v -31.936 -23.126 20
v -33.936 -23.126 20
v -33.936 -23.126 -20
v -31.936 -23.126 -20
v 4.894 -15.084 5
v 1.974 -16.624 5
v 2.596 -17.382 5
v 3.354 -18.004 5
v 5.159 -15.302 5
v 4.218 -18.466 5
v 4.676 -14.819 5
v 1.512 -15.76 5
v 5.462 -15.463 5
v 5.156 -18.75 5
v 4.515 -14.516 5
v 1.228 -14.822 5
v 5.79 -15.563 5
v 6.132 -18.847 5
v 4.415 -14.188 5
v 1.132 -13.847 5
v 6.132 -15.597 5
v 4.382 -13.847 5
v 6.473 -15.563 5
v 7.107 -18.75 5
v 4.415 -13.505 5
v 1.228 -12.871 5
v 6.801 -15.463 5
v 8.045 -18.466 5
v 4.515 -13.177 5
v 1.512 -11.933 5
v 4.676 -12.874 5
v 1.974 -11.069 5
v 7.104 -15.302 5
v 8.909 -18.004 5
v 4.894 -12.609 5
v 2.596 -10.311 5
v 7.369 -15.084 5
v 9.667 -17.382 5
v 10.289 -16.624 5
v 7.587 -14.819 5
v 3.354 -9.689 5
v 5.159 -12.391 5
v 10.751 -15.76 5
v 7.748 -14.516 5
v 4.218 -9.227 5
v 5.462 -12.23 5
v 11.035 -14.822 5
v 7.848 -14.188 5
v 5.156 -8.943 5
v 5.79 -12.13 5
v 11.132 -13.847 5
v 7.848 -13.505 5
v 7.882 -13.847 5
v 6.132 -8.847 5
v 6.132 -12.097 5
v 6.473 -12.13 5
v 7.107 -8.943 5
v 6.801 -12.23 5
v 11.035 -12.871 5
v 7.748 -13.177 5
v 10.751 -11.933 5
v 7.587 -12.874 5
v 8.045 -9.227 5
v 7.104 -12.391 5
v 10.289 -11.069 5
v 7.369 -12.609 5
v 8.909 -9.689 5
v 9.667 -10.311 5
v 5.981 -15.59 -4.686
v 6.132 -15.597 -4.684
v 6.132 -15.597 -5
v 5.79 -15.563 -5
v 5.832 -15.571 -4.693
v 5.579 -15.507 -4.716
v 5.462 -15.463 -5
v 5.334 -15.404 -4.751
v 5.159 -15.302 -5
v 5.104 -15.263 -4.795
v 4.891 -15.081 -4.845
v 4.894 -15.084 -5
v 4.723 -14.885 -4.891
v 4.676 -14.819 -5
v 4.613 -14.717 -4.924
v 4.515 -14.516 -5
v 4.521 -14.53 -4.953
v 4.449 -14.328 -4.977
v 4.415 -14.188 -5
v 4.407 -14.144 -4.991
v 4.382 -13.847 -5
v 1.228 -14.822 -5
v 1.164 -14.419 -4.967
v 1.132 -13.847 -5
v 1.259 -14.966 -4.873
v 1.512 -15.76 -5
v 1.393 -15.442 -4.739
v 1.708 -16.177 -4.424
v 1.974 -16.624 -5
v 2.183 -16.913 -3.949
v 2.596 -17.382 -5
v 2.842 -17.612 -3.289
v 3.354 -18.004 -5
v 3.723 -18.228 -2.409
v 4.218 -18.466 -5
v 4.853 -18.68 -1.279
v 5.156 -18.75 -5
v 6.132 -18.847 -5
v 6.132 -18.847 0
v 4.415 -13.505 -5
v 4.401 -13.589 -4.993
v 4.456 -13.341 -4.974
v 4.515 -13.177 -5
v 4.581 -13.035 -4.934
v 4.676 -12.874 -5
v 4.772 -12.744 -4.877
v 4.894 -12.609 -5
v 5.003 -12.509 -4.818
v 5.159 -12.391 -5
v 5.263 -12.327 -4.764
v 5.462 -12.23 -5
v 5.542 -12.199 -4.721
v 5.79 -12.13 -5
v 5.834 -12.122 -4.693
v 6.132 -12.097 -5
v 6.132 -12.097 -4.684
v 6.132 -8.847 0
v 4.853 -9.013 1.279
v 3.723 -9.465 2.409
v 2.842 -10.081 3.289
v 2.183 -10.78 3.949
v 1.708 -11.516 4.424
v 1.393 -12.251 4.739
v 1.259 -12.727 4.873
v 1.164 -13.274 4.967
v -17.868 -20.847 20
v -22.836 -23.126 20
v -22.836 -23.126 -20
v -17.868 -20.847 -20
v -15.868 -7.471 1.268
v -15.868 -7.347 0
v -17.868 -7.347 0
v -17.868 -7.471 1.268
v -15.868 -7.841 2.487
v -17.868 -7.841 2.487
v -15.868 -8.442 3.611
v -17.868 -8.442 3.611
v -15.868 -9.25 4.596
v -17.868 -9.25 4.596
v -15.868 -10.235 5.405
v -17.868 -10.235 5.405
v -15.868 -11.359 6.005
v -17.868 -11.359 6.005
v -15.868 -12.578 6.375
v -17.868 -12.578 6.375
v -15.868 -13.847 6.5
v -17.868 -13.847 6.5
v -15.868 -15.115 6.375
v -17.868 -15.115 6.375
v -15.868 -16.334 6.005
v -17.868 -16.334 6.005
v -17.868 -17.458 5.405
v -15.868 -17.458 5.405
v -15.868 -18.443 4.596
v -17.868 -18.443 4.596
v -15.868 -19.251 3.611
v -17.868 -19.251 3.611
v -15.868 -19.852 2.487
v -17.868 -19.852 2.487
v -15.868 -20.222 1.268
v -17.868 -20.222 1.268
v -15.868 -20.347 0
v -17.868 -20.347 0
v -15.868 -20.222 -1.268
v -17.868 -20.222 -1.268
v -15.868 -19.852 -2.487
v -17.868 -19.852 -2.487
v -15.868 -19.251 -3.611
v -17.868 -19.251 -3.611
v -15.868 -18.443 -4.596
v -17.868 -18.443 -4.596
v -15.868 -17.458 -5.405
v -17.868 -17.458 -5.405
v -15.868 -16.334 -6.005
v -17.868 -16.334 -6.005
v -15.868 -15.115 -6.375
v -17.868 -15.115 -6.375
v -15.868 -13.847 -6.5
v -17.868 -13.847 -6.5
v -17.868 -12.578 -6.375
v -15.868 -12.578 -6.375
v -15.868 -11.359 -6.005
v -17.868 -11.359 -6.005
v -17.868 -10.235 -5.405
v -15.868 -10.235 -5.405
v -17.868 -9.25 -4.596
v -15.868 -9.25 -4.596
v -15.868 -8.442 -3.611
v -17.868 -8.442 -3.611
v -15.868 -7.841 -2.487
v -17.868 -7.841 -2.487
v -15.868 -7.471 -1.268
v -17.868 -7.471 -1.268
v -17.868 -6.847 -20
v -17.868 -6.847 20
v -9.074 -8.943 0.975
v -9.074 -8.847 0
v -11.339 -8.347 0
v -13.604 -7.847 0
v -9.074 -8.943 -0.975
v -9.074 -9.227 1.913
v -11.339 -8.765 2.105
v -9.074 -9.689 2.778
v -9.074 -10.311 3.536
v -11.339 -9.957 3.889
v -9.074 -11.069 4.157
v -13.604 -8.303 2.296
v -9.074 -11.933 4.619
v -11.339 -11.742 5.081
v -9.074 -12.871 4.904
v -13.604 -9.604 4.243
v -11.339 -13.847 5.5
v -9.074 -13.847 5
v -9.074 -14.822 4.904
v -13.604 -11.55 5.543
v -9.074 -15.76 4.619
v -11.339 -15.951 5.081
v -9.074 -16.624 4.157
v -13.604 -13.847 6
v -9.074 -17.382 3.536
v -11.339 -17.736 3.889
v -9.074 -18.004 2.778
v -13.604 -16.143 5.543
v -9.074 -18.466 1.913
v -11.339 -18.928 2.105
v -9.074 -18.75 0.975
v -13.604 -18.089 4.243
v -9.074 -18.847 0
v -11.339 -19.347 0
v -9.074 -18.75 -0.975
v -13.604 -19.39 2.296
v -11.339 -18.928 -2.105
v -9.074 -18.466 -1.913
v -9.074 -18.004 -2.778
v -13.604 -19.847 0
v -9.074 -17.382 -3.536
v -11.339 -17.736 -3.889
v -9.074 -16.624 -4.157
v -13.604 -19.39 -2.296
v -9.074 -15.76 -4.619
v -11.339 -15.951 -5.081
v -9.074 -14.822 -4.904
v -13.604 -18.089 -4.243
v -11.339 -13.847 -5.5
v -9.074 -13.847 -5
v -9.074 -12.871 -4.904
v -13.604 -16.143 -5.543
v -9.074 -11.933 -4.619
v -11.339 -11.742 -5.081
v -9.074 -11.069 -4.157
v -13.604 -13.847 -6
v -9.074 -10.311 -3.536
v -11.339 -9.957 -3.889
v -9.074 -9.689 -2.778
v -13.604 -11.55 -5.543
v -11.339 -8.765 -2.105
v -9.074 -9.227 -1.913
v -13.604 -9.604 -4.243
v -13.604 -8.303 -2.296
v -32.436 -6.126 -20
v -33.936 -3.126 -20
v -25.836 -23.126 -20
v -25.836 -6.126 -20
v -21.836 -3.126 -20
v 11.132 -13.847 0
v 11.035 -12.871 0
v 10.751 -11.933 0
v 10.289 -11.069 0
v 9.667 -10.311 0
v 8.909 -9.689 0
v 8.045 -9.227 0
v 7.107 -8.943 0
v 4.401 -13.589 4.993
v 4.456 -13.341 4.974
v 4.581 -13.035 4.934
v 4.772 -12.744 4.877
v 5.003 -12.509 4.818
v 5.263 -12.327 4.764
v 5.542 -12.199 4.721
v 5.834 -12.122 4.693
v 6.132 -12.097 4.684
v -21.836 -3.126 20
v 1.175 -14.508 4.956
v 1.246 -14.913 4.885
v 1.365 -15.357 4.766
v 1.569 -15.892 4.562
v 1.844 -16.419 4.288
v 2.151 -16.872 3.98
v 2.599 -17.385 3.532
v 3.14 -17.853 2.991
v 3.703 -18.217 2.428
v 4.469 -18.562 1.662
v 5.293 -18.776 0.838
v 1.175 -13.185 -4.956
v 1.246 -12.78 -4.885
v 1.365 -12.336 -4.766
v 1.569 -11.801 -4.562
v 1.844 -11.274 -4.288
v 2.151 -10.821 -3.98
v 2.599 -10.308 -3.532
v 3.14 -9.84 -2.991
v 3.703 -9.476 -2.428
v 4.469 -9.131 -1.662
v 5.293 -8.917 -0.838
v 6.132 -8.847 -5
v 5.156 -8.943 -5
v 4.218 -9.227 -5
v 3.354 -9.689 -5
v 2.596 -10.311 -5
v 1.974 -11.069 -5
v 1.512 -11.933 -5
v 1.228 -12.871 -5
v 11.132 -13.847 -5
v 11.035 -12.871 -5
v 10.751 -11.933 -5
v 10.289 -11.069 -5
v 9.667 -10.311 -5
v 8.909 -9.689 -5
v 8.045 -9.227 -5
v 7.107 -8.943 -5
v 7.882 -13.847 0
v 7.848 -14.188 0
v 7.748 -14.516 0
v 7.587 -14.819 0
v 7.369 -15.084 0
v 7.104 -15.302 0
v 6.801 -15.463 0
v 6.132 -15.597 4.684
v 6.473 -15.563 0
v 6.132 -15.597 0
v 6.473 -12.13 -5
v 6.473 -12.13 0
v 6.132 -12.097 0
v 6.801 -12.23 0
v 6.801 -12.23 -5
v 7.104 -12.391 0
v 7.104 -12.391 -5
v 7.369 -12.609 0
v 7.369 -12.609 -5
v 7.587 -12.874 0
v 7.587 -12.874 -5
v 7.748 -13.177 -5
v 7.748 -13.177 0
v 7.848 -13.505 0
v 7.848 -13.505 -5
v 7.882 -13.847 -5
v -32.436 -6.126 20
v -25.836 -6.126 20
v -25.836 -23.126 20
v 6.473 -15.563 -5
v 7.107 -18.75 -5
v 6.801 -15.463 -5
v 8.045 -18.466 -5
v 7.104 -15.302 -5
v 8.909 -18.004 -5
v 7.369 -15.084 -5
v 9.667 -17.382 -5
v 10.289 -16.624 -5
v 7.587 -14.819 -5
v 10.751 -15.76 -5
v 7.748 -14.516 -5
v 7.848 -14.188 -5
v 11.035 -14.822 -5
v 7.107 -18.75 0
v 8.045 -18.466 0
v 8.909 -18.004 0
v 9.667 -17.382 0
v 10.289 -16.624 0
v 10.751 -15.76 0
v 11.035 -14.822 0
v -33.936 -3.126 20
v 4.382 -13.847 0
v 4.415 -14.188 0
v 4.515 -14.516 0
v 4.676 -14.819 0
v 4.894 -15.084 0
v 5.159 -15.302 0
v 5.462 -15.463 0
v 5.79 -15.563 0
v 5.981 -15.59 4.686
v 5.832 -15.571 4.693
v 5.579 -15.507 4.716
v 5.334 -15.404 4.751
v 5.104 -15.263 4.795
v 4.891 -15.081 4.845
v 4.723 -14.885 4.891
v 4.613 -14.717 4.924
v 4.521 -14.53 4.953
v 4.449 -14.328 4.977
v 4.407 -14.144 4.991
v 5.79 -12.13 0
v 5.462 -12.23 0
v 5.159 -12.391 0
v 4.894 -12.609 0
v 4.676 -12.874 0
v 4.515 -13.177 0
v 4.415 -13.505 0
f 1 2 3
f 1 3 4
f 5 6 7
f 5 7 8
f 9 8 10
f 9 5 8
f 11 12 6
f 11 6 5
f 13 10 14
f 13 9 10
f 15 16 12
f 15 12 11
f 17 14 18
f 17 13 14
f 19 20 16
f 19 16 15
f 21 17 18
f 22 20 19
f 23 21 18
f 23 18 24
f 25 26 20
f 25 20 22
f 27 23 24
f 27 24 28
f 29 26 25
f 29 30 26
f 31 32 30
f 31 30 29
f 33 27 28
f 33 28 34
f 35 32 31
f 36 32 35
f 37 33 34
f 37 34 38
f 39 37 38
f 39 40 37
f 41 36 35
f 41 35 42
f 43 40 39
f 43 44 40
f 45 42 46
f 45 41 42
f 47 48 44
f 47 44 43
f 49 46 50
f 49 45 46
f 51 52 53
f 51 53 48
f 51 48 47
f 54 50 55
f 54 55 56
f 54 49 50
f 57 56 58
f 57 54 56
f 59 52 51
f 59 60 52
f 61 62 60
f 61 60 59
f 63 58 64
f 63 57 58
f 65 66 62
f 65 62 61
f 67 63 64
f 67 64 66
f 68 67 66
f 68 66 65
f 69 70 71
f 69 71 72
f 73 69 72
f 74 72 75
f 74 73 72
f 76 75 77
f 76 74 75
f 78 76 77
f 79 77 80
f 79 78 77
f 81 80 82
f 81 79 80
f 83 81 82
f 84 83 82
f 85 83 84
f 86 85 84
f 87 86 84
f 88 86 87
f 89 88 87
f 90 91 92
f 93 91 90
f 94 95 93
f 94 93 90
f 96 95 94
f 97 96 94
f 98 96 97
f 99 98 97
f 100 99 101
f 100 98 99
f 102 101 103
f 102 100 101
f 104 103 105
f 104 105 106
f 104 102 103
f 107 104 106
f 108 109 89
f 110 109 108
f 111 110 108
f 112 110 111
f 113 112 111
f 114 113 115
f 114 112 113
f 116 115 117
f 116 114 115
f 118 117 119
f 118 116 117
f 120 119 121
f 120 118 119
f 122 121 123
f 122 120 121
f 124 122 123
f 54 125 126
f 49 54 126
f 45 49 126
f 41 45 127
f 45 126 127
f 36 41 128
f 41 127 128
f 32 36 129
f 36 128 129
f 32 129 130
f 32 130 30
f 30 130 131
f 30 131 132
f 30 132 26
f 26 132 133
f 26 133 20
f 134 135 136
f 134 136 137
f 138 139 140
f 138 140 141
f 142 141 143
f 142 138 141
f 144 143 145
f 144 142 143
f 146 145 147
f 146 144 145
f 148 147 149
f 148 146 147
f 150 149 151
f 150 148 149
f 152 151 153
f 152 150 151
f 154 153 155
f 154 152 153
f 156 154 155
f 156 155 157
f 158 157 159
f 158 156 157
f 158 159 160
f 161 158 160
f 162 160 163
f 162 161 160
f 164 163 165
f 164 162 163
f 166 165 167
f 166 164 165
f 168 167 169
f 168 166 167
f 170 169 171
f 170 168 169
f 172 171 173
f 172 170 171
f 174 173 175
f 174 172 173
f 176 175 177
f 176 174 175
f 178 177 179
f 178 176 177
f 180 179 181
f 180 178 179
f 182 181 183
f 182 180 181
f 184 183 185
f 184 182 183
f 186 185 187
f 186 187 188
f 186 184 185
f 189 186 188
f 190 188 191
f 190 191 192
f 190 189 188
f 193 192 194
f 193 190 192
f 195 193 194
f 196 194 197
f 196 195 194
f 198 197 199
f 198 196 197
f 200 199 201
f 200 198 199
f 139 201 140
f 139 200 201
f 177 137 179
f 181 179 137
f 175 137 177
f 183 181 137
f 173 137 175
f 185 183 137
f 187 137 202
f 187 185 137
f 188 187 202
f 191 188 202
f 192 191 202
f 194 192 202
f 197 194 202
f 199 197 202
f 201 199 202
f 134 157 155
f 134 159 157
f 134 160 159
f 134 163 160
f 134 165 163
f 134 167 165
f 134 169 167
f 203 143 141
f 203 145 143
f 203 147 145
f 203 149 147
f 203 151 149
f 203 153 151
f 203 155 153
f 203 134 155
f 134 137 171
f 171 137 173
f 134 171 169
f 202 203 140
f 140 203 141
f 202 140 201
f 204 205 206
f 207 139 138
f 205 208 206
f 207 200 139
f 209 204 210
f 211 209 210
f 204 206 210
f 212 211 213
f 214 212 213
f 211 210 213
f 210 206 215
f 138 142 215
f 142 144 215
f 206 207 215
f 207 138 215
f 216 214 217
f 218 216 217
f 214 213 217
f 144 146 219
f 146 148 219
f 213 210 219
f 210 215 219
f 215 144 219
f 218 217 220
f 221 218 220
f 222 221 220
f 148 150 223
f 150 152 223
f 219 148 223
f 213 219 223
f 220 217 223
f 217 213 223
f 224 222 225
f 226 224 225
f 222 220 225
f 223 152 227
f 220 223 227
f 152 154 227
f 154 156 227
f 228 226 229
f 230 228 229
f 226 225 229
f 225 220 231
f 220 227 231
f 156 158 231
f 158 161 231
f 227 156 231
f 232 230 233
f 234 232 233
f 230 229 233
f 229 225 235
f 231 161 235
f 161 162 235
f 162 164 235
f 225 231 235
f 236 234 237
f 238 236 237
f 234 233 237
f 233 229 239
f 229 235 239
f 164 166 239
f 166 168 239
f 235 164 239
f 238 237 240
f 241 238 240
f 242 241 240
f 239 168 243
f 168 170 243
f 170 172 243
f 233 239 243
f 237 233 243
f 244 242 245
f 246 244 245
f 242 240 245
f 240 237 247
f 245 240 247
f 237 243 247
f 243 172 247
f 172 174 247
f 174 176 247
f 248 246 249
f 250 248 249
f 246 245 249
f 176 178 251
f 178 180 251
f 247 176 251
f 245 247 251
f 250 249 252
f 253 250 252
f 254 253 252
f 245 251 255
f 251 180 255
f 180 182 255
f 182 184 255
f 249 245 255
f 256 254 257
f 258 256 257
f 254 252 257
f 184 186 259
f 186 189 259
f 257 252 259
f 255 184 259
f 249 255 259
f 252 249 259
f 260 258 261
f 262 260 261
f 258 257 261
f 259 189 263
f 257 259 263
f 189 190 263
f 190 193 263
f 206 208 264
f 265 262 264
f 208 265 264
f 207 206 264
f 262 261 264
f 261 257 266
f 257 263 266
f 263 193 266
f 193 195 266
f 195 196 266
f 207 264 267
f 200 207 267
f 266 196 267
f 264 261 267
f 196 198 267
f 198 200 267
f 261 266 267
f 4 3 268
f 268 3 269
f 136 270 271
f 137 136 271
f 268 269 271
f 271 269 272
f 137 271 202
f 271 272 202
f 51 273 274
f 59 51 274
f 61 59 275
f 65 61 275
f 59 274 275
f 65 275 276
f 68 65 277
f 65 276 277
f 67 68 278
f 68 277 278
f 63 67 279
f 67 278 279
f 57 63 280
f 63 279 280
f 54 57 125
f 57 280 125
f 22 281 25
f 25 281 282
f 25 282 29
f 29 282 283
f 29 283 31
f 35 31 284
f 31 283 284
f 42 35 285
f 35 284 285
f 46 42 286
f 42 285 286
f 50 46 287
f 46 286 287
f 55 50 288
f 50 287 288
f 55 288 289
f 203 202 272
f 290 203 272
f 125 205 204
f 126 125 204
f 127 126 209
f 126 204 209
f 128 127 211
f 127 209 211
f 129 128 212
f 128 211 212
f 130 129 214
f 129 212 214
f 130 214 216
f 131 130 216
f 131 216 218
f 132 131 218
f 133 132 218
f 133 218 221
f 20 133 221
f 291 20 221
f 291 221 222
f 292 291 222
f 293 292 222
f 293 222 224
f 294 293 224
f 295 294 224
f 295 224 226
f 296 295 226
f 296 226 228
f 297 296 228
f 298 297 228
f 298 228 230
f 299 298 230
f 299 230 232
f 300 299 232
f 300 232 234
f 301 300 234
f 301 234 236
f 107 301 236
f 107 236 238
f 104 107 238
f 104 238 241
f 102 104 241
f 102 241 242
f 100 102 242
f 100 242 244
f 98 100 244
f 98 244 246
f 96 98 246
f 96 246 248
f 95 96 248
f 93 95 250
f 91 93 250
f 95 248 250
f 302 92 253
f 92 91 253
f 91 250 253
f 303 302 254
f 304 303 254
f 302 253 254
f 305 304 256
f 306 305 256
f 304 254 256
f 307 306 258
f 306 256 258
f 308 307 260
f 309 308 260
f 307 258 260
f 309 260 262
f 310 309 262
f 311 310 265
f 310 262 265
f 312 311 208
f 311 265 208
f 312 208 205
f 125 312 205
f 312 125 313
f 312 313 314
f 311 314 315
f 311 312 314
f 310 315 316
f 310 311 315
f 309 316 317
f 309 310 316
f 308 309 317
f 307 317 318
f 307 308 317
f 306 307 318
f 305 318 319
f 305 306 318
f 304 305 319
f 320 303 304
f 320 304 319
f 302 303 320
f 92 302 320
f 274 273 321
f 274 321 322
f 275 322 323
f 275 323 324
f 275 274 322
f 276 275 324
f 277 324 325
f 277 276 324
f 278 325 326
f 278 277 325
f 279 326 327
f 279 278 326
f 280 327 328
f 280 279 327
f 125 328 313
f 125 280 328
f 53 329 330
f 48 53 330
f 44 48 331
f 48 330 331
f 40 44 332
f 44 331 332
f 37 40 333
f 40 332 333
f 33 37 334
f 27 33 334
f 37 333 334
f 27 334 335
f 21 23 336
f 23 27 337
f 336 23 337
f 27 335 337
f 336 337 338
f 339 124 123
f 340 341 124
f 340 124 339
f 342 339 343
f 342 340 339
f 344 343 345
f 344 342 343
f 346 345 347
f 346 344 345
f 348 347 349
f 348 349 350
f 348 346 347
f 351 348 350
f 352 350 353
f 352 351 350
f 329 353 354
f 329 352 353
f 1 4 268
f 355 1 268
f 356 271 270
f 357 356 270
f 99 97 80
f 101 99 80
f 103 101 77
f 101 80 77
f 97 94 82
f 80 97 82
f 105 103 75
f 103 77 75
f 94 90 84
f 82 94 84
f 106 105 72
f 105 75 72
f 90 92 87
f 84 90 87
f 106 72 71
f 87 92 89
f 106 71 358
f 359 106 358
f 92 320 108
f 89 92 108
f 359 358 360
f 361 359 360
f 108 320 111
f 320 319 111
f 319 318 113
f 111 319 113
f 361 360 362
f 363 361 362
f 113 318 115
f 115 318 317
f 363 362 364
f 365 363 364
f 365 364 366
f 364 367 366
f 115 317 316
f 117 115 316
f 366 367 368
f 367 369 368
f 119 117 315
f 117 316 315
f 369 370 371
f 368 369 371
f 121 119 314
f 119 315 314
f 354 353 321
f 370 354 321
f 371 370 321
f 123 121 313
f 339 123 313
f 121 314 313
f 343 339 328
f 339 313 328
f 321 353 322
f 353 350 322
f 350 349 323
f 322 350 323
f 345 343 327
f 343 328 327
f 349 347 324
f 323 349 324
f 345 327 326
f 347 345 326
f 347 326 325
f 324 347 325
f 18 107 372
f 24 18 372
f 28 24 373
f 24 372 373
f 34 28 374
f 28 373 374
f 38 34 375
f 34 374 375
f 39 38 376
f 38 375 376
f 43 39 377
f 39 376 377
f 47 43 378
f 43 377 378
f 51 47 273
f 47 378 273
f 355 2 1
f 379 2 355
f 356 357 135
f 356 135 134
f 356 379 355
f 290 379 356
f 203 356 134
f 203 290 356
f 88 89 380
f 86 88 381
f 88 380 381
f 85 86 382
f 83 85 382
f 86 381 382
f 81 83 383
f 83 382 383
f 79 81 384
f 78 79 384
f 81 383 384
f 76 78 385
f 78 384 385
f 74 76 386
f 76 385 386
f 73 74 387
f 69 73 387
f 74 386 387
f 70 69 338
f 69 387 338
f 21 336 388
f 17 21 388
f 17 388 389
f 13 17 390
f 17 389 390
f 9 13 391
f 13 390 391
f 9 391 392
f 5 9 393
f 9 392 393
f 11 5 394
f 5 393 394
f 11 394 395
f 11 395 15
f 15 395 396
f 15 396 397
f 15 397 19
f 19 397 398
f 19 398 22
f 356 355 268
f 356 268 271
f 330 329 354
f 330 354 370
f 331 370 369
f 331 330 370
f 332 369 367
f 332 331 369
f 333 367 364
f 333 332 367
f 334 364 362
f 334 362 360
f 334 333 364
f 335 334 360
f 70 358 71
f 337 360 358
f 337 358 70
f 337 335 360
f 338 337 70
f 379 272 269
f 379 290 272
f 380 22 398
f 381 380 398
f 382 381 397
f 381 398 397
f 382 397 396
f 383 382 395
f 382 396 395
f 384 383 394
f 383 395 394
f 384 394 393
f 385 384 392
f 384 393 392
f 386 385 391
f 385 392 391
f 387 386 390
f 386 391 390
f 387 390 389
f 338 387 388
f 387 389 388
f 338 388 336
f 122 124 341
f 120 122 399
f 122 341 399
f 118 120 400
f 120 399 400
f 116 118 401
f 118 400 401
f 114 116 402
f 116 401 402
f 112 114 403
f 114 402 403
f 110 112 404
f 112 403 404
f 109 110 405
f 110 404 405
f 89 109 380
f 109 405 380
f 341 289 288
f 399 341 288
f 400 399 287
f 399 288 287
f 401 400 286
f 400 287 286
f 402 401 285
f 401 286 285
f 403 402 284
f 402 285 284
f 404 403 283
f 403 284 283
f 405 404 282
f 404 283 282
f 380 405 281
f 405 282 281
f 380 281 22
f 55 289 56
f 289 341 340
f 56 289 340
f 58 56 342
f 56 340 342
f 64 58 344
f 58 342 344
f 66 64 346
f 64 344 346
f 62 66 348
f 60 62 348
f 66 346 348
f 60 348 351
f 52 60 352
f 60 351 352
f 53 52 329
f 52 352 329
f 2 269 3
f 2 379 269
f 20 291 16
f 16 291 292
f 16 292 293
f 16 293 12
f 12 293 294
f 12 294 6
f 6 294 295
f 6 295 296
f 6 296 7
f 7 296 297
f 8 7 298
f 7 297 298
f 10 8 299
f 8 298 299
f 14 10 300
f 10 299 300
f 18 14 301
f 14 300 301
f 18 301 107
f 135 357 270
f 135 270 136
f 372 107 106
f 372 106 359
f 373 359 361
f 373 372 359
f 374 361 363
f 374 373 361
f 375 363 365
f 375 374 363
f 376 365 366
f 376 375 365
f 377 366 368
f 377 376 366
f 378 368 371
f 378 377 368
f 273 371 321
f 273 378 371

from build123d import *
from build123d import SkipClean  # not in build123d's __all__

# Parameters (mm, degrees)
F1_DEPTH = 20
F0_W     = 2
F0_H     = 6.5
F5_DEPTH = 5
F6_DEPTH = 5


with BuildPart() as f1:
    # F0 (on Top) → F1 (new body, symmetric)
    with BuildSketch(Plane.XY):
        Polygon((-33.9359952807, -3.1263027601), (-33.9359952807, -23.1263027601), (-31.9359952807, -23.1263027601), (-32.4359952807, -6.1263027601), (-25.8359952807, -6.1263027601), (-25.8359952807, -23.1263027601), (-22.8359952807, -23.1263027601), (-17.8684814229, -20.8465269788), (-17.8684814229, -20.3465269788), (-17.8684814229, -13.8465269788), (-17.8684814229, -7.3465269788), (-17.8684814229, -6.8465269788), (-21.8359952807, -3.1263027601), align=None)
    extrude(amount=F1_DEPTH, both=True)

    # F0 (on Top) → F2 (revolve)
    with BuildSketch(Plane.XY):
        with Locations((-16.8684814229, -10.5965269788)):
            Rectangle(F0_W, F0_H)
    revolve(axis=Axis((-16.8684814229, -13.8465269788, 0), (1, 0, 0)))

    # F0 (on Top) → F3 (revolve)
    with BuildSketch(Plane.XY):
        Polygon((-9.0739962115, -8.8465269788), (-15.8684814229, -7.3465269788), (-15.8684814229, -13.8465269788), (-9.0739962115, -13.8465269788), align=None)
    revolve(axis=Axis((-4.8684814229, -13.8465269788, 0), (1, 0, 0)))

    # F0 (on Top) → F4 (revolve)
    with BuildSketch(Plane.XY):
        with BuildLine():
            Line((6.1315185771, -8.8465269788), (-9.0739962115, -8.8465269788))
            Line((-9.0739962115, -8.8465269788), (-9.0739962115, -13.8465269788))
            Line((-9.0739962115, -13.8465269788), (1.1315185771, -13.8465269788))
            ThreePointArc((1.1315185771, -13.8465269788), (2.5959846712, -10.3109930728), (6.1315185771, -8.8465269788))
        make_face()
        with BuildLine():
            Line((6.1315185771, -12.0965269788), (6.1315185771, -8.8465269788))
            ThreePointArc((6.1315185771, -8.8465269788), (2.5959846712, -10.3109930728), (1.1315185771, -13.8465269788))
            Line((1.1315185771, -13.8465269788), (4.3815185771, -13.8465269788))
            ThreePointArc((4.3815185771, -13.8465269788), (4.89408171, -12.6090901117), (6.1315185771, -12.0965269788))
        make_face()
        with BuildLine():
            Line((6.1315185771, -13.8465269788), (6.1315185771, -12.0965269788))
            ThreePointArc((6.1315185771, -12.0965269788), (4.89408171, -12.6090901117), (4.3815185771, -13.8465269788))
            Line((4.3815185771, -13.8465269788), (6.1315185771, -13.8465269788))
        make_face()
    revolve(axis=Axis((-4.8684814229, -13.8465269788, 0), (1, 0, 0)))

    # F0 (on Top) → F5 (cut, symmetric)
    with BuildSketch(Plane.XY):
        with BuildLine():
            Line((6.1315185771, -13.8465269788), (4.3815185771, -13.8465269788))
            ThreePointArc((4.3815185771, -13.8465269788), (4.89408171, -15.0839638459), (6.1315185771, -15.5965269788))
            Line((6.1315185771, -15.5965269788), (6.1315185771, -13.8465269788))
        make_face()
        with BuildLine():
            ThreePointArc((7.8815185771, -13.8465269788), (7.3689554442, -12.6090901117), (6.1315185771, -12.0965269788))
            Line((6.1315185771, -12.0965269788), (6.1315185771, -13.8465269788))
            Line((6.1315185771, -13.8465269788), (6.1315185771, -15.5965269788))
            ThreePointArc((6.1315185771, -15.5965269788), (7.3689554442, -15.0839638459), (7.8815185771, -13.8465269788))
        make_face()
        with BuildLine():
            Line((6.1315185771, -13.8465269788), (6.1315185771, -12.0965269788))
            ThreePointArc((6.1315185771, -12.0965269788), (4.89408171, -12.6090901117), (4.3815185771, -13.8465269788))
            Line((4.3815185771, -13.8465269788), (6.1315185771, -13.8465269788))
        make_face()
    extrude(amount=F5_DEPTH, both=True, mode=Mode.SUBTRACT)

    # F0 (on Top) → F6 (join, symmetric)
    with BuildSketch(Plane.XY):
        with BuildLine():
            Line((6.1315185771, -12.0965269788), (6.1315185771, -8.8465269788))
            ThreePointArc((6.1315185771, -8.8465269788), (2.5959846712, -10.3109930728), (1.1315185771, -13.8465269788))
            Line((1.1315185771, -13.8465269788), (4.3815185771, -13.8465269788))
            ThreePointArc((4.3815185771, -13.8465269788), (4.89408171, -12.6090901117), (6.1315185771, -12.0965269788))
        make_face()
        with BuildLine():
            Line((4.3815185771, -13.8465269788), (1.1315185771, -13.8465269788))
            ThreePointArc((1.1315185771, -13.8465269788), (2.5959846712, -17.3820608847), (6.1315185771, -18.8465269788))
            Line((6.1315185771, -18.8465269788), (6.1315185771, -15.5965269788))
            ThreePointArc((6.1315185771, -15.5965269788), (4.89408171, -15.0839638459), (4.3815185771, -13.8465269788))
        make_face()
        with BuildLine():
            ThreePointArc((11.1315185771, -13.8465269788), (9.667052483, -10.3109930728), (6.1315185771, -8.8465269788))
            Line((6.1315185771, -8.8465269788), (6.1315185771, -12.0965269788))
            ThreePointArc((6.1315185771, -12.0965269788), (7.3689554442, -12.6090901117), (7.8815185771, -13.8465269788))
            ThreePointArc((7.8815185771, -13.8465269788), (7.3689554442, -15.0839638459), (6.1315185771, -15.5965269788))
            Line((6.1315185771, -15.5965269788), (6.1315185771, -18.8465269788))
            ThreePointArc((6.1315185771, -18.8465269788), (9.667052483, -17.3820608847), (11.1315185771, -13.8465269788))
        make_face()
    with SkipClean():  # cleaning this boolean's faces spoils the solid; the shape is the same uncleaned
        extrude(amount=F6_DEPTH, both=True)


solid = f1.part
